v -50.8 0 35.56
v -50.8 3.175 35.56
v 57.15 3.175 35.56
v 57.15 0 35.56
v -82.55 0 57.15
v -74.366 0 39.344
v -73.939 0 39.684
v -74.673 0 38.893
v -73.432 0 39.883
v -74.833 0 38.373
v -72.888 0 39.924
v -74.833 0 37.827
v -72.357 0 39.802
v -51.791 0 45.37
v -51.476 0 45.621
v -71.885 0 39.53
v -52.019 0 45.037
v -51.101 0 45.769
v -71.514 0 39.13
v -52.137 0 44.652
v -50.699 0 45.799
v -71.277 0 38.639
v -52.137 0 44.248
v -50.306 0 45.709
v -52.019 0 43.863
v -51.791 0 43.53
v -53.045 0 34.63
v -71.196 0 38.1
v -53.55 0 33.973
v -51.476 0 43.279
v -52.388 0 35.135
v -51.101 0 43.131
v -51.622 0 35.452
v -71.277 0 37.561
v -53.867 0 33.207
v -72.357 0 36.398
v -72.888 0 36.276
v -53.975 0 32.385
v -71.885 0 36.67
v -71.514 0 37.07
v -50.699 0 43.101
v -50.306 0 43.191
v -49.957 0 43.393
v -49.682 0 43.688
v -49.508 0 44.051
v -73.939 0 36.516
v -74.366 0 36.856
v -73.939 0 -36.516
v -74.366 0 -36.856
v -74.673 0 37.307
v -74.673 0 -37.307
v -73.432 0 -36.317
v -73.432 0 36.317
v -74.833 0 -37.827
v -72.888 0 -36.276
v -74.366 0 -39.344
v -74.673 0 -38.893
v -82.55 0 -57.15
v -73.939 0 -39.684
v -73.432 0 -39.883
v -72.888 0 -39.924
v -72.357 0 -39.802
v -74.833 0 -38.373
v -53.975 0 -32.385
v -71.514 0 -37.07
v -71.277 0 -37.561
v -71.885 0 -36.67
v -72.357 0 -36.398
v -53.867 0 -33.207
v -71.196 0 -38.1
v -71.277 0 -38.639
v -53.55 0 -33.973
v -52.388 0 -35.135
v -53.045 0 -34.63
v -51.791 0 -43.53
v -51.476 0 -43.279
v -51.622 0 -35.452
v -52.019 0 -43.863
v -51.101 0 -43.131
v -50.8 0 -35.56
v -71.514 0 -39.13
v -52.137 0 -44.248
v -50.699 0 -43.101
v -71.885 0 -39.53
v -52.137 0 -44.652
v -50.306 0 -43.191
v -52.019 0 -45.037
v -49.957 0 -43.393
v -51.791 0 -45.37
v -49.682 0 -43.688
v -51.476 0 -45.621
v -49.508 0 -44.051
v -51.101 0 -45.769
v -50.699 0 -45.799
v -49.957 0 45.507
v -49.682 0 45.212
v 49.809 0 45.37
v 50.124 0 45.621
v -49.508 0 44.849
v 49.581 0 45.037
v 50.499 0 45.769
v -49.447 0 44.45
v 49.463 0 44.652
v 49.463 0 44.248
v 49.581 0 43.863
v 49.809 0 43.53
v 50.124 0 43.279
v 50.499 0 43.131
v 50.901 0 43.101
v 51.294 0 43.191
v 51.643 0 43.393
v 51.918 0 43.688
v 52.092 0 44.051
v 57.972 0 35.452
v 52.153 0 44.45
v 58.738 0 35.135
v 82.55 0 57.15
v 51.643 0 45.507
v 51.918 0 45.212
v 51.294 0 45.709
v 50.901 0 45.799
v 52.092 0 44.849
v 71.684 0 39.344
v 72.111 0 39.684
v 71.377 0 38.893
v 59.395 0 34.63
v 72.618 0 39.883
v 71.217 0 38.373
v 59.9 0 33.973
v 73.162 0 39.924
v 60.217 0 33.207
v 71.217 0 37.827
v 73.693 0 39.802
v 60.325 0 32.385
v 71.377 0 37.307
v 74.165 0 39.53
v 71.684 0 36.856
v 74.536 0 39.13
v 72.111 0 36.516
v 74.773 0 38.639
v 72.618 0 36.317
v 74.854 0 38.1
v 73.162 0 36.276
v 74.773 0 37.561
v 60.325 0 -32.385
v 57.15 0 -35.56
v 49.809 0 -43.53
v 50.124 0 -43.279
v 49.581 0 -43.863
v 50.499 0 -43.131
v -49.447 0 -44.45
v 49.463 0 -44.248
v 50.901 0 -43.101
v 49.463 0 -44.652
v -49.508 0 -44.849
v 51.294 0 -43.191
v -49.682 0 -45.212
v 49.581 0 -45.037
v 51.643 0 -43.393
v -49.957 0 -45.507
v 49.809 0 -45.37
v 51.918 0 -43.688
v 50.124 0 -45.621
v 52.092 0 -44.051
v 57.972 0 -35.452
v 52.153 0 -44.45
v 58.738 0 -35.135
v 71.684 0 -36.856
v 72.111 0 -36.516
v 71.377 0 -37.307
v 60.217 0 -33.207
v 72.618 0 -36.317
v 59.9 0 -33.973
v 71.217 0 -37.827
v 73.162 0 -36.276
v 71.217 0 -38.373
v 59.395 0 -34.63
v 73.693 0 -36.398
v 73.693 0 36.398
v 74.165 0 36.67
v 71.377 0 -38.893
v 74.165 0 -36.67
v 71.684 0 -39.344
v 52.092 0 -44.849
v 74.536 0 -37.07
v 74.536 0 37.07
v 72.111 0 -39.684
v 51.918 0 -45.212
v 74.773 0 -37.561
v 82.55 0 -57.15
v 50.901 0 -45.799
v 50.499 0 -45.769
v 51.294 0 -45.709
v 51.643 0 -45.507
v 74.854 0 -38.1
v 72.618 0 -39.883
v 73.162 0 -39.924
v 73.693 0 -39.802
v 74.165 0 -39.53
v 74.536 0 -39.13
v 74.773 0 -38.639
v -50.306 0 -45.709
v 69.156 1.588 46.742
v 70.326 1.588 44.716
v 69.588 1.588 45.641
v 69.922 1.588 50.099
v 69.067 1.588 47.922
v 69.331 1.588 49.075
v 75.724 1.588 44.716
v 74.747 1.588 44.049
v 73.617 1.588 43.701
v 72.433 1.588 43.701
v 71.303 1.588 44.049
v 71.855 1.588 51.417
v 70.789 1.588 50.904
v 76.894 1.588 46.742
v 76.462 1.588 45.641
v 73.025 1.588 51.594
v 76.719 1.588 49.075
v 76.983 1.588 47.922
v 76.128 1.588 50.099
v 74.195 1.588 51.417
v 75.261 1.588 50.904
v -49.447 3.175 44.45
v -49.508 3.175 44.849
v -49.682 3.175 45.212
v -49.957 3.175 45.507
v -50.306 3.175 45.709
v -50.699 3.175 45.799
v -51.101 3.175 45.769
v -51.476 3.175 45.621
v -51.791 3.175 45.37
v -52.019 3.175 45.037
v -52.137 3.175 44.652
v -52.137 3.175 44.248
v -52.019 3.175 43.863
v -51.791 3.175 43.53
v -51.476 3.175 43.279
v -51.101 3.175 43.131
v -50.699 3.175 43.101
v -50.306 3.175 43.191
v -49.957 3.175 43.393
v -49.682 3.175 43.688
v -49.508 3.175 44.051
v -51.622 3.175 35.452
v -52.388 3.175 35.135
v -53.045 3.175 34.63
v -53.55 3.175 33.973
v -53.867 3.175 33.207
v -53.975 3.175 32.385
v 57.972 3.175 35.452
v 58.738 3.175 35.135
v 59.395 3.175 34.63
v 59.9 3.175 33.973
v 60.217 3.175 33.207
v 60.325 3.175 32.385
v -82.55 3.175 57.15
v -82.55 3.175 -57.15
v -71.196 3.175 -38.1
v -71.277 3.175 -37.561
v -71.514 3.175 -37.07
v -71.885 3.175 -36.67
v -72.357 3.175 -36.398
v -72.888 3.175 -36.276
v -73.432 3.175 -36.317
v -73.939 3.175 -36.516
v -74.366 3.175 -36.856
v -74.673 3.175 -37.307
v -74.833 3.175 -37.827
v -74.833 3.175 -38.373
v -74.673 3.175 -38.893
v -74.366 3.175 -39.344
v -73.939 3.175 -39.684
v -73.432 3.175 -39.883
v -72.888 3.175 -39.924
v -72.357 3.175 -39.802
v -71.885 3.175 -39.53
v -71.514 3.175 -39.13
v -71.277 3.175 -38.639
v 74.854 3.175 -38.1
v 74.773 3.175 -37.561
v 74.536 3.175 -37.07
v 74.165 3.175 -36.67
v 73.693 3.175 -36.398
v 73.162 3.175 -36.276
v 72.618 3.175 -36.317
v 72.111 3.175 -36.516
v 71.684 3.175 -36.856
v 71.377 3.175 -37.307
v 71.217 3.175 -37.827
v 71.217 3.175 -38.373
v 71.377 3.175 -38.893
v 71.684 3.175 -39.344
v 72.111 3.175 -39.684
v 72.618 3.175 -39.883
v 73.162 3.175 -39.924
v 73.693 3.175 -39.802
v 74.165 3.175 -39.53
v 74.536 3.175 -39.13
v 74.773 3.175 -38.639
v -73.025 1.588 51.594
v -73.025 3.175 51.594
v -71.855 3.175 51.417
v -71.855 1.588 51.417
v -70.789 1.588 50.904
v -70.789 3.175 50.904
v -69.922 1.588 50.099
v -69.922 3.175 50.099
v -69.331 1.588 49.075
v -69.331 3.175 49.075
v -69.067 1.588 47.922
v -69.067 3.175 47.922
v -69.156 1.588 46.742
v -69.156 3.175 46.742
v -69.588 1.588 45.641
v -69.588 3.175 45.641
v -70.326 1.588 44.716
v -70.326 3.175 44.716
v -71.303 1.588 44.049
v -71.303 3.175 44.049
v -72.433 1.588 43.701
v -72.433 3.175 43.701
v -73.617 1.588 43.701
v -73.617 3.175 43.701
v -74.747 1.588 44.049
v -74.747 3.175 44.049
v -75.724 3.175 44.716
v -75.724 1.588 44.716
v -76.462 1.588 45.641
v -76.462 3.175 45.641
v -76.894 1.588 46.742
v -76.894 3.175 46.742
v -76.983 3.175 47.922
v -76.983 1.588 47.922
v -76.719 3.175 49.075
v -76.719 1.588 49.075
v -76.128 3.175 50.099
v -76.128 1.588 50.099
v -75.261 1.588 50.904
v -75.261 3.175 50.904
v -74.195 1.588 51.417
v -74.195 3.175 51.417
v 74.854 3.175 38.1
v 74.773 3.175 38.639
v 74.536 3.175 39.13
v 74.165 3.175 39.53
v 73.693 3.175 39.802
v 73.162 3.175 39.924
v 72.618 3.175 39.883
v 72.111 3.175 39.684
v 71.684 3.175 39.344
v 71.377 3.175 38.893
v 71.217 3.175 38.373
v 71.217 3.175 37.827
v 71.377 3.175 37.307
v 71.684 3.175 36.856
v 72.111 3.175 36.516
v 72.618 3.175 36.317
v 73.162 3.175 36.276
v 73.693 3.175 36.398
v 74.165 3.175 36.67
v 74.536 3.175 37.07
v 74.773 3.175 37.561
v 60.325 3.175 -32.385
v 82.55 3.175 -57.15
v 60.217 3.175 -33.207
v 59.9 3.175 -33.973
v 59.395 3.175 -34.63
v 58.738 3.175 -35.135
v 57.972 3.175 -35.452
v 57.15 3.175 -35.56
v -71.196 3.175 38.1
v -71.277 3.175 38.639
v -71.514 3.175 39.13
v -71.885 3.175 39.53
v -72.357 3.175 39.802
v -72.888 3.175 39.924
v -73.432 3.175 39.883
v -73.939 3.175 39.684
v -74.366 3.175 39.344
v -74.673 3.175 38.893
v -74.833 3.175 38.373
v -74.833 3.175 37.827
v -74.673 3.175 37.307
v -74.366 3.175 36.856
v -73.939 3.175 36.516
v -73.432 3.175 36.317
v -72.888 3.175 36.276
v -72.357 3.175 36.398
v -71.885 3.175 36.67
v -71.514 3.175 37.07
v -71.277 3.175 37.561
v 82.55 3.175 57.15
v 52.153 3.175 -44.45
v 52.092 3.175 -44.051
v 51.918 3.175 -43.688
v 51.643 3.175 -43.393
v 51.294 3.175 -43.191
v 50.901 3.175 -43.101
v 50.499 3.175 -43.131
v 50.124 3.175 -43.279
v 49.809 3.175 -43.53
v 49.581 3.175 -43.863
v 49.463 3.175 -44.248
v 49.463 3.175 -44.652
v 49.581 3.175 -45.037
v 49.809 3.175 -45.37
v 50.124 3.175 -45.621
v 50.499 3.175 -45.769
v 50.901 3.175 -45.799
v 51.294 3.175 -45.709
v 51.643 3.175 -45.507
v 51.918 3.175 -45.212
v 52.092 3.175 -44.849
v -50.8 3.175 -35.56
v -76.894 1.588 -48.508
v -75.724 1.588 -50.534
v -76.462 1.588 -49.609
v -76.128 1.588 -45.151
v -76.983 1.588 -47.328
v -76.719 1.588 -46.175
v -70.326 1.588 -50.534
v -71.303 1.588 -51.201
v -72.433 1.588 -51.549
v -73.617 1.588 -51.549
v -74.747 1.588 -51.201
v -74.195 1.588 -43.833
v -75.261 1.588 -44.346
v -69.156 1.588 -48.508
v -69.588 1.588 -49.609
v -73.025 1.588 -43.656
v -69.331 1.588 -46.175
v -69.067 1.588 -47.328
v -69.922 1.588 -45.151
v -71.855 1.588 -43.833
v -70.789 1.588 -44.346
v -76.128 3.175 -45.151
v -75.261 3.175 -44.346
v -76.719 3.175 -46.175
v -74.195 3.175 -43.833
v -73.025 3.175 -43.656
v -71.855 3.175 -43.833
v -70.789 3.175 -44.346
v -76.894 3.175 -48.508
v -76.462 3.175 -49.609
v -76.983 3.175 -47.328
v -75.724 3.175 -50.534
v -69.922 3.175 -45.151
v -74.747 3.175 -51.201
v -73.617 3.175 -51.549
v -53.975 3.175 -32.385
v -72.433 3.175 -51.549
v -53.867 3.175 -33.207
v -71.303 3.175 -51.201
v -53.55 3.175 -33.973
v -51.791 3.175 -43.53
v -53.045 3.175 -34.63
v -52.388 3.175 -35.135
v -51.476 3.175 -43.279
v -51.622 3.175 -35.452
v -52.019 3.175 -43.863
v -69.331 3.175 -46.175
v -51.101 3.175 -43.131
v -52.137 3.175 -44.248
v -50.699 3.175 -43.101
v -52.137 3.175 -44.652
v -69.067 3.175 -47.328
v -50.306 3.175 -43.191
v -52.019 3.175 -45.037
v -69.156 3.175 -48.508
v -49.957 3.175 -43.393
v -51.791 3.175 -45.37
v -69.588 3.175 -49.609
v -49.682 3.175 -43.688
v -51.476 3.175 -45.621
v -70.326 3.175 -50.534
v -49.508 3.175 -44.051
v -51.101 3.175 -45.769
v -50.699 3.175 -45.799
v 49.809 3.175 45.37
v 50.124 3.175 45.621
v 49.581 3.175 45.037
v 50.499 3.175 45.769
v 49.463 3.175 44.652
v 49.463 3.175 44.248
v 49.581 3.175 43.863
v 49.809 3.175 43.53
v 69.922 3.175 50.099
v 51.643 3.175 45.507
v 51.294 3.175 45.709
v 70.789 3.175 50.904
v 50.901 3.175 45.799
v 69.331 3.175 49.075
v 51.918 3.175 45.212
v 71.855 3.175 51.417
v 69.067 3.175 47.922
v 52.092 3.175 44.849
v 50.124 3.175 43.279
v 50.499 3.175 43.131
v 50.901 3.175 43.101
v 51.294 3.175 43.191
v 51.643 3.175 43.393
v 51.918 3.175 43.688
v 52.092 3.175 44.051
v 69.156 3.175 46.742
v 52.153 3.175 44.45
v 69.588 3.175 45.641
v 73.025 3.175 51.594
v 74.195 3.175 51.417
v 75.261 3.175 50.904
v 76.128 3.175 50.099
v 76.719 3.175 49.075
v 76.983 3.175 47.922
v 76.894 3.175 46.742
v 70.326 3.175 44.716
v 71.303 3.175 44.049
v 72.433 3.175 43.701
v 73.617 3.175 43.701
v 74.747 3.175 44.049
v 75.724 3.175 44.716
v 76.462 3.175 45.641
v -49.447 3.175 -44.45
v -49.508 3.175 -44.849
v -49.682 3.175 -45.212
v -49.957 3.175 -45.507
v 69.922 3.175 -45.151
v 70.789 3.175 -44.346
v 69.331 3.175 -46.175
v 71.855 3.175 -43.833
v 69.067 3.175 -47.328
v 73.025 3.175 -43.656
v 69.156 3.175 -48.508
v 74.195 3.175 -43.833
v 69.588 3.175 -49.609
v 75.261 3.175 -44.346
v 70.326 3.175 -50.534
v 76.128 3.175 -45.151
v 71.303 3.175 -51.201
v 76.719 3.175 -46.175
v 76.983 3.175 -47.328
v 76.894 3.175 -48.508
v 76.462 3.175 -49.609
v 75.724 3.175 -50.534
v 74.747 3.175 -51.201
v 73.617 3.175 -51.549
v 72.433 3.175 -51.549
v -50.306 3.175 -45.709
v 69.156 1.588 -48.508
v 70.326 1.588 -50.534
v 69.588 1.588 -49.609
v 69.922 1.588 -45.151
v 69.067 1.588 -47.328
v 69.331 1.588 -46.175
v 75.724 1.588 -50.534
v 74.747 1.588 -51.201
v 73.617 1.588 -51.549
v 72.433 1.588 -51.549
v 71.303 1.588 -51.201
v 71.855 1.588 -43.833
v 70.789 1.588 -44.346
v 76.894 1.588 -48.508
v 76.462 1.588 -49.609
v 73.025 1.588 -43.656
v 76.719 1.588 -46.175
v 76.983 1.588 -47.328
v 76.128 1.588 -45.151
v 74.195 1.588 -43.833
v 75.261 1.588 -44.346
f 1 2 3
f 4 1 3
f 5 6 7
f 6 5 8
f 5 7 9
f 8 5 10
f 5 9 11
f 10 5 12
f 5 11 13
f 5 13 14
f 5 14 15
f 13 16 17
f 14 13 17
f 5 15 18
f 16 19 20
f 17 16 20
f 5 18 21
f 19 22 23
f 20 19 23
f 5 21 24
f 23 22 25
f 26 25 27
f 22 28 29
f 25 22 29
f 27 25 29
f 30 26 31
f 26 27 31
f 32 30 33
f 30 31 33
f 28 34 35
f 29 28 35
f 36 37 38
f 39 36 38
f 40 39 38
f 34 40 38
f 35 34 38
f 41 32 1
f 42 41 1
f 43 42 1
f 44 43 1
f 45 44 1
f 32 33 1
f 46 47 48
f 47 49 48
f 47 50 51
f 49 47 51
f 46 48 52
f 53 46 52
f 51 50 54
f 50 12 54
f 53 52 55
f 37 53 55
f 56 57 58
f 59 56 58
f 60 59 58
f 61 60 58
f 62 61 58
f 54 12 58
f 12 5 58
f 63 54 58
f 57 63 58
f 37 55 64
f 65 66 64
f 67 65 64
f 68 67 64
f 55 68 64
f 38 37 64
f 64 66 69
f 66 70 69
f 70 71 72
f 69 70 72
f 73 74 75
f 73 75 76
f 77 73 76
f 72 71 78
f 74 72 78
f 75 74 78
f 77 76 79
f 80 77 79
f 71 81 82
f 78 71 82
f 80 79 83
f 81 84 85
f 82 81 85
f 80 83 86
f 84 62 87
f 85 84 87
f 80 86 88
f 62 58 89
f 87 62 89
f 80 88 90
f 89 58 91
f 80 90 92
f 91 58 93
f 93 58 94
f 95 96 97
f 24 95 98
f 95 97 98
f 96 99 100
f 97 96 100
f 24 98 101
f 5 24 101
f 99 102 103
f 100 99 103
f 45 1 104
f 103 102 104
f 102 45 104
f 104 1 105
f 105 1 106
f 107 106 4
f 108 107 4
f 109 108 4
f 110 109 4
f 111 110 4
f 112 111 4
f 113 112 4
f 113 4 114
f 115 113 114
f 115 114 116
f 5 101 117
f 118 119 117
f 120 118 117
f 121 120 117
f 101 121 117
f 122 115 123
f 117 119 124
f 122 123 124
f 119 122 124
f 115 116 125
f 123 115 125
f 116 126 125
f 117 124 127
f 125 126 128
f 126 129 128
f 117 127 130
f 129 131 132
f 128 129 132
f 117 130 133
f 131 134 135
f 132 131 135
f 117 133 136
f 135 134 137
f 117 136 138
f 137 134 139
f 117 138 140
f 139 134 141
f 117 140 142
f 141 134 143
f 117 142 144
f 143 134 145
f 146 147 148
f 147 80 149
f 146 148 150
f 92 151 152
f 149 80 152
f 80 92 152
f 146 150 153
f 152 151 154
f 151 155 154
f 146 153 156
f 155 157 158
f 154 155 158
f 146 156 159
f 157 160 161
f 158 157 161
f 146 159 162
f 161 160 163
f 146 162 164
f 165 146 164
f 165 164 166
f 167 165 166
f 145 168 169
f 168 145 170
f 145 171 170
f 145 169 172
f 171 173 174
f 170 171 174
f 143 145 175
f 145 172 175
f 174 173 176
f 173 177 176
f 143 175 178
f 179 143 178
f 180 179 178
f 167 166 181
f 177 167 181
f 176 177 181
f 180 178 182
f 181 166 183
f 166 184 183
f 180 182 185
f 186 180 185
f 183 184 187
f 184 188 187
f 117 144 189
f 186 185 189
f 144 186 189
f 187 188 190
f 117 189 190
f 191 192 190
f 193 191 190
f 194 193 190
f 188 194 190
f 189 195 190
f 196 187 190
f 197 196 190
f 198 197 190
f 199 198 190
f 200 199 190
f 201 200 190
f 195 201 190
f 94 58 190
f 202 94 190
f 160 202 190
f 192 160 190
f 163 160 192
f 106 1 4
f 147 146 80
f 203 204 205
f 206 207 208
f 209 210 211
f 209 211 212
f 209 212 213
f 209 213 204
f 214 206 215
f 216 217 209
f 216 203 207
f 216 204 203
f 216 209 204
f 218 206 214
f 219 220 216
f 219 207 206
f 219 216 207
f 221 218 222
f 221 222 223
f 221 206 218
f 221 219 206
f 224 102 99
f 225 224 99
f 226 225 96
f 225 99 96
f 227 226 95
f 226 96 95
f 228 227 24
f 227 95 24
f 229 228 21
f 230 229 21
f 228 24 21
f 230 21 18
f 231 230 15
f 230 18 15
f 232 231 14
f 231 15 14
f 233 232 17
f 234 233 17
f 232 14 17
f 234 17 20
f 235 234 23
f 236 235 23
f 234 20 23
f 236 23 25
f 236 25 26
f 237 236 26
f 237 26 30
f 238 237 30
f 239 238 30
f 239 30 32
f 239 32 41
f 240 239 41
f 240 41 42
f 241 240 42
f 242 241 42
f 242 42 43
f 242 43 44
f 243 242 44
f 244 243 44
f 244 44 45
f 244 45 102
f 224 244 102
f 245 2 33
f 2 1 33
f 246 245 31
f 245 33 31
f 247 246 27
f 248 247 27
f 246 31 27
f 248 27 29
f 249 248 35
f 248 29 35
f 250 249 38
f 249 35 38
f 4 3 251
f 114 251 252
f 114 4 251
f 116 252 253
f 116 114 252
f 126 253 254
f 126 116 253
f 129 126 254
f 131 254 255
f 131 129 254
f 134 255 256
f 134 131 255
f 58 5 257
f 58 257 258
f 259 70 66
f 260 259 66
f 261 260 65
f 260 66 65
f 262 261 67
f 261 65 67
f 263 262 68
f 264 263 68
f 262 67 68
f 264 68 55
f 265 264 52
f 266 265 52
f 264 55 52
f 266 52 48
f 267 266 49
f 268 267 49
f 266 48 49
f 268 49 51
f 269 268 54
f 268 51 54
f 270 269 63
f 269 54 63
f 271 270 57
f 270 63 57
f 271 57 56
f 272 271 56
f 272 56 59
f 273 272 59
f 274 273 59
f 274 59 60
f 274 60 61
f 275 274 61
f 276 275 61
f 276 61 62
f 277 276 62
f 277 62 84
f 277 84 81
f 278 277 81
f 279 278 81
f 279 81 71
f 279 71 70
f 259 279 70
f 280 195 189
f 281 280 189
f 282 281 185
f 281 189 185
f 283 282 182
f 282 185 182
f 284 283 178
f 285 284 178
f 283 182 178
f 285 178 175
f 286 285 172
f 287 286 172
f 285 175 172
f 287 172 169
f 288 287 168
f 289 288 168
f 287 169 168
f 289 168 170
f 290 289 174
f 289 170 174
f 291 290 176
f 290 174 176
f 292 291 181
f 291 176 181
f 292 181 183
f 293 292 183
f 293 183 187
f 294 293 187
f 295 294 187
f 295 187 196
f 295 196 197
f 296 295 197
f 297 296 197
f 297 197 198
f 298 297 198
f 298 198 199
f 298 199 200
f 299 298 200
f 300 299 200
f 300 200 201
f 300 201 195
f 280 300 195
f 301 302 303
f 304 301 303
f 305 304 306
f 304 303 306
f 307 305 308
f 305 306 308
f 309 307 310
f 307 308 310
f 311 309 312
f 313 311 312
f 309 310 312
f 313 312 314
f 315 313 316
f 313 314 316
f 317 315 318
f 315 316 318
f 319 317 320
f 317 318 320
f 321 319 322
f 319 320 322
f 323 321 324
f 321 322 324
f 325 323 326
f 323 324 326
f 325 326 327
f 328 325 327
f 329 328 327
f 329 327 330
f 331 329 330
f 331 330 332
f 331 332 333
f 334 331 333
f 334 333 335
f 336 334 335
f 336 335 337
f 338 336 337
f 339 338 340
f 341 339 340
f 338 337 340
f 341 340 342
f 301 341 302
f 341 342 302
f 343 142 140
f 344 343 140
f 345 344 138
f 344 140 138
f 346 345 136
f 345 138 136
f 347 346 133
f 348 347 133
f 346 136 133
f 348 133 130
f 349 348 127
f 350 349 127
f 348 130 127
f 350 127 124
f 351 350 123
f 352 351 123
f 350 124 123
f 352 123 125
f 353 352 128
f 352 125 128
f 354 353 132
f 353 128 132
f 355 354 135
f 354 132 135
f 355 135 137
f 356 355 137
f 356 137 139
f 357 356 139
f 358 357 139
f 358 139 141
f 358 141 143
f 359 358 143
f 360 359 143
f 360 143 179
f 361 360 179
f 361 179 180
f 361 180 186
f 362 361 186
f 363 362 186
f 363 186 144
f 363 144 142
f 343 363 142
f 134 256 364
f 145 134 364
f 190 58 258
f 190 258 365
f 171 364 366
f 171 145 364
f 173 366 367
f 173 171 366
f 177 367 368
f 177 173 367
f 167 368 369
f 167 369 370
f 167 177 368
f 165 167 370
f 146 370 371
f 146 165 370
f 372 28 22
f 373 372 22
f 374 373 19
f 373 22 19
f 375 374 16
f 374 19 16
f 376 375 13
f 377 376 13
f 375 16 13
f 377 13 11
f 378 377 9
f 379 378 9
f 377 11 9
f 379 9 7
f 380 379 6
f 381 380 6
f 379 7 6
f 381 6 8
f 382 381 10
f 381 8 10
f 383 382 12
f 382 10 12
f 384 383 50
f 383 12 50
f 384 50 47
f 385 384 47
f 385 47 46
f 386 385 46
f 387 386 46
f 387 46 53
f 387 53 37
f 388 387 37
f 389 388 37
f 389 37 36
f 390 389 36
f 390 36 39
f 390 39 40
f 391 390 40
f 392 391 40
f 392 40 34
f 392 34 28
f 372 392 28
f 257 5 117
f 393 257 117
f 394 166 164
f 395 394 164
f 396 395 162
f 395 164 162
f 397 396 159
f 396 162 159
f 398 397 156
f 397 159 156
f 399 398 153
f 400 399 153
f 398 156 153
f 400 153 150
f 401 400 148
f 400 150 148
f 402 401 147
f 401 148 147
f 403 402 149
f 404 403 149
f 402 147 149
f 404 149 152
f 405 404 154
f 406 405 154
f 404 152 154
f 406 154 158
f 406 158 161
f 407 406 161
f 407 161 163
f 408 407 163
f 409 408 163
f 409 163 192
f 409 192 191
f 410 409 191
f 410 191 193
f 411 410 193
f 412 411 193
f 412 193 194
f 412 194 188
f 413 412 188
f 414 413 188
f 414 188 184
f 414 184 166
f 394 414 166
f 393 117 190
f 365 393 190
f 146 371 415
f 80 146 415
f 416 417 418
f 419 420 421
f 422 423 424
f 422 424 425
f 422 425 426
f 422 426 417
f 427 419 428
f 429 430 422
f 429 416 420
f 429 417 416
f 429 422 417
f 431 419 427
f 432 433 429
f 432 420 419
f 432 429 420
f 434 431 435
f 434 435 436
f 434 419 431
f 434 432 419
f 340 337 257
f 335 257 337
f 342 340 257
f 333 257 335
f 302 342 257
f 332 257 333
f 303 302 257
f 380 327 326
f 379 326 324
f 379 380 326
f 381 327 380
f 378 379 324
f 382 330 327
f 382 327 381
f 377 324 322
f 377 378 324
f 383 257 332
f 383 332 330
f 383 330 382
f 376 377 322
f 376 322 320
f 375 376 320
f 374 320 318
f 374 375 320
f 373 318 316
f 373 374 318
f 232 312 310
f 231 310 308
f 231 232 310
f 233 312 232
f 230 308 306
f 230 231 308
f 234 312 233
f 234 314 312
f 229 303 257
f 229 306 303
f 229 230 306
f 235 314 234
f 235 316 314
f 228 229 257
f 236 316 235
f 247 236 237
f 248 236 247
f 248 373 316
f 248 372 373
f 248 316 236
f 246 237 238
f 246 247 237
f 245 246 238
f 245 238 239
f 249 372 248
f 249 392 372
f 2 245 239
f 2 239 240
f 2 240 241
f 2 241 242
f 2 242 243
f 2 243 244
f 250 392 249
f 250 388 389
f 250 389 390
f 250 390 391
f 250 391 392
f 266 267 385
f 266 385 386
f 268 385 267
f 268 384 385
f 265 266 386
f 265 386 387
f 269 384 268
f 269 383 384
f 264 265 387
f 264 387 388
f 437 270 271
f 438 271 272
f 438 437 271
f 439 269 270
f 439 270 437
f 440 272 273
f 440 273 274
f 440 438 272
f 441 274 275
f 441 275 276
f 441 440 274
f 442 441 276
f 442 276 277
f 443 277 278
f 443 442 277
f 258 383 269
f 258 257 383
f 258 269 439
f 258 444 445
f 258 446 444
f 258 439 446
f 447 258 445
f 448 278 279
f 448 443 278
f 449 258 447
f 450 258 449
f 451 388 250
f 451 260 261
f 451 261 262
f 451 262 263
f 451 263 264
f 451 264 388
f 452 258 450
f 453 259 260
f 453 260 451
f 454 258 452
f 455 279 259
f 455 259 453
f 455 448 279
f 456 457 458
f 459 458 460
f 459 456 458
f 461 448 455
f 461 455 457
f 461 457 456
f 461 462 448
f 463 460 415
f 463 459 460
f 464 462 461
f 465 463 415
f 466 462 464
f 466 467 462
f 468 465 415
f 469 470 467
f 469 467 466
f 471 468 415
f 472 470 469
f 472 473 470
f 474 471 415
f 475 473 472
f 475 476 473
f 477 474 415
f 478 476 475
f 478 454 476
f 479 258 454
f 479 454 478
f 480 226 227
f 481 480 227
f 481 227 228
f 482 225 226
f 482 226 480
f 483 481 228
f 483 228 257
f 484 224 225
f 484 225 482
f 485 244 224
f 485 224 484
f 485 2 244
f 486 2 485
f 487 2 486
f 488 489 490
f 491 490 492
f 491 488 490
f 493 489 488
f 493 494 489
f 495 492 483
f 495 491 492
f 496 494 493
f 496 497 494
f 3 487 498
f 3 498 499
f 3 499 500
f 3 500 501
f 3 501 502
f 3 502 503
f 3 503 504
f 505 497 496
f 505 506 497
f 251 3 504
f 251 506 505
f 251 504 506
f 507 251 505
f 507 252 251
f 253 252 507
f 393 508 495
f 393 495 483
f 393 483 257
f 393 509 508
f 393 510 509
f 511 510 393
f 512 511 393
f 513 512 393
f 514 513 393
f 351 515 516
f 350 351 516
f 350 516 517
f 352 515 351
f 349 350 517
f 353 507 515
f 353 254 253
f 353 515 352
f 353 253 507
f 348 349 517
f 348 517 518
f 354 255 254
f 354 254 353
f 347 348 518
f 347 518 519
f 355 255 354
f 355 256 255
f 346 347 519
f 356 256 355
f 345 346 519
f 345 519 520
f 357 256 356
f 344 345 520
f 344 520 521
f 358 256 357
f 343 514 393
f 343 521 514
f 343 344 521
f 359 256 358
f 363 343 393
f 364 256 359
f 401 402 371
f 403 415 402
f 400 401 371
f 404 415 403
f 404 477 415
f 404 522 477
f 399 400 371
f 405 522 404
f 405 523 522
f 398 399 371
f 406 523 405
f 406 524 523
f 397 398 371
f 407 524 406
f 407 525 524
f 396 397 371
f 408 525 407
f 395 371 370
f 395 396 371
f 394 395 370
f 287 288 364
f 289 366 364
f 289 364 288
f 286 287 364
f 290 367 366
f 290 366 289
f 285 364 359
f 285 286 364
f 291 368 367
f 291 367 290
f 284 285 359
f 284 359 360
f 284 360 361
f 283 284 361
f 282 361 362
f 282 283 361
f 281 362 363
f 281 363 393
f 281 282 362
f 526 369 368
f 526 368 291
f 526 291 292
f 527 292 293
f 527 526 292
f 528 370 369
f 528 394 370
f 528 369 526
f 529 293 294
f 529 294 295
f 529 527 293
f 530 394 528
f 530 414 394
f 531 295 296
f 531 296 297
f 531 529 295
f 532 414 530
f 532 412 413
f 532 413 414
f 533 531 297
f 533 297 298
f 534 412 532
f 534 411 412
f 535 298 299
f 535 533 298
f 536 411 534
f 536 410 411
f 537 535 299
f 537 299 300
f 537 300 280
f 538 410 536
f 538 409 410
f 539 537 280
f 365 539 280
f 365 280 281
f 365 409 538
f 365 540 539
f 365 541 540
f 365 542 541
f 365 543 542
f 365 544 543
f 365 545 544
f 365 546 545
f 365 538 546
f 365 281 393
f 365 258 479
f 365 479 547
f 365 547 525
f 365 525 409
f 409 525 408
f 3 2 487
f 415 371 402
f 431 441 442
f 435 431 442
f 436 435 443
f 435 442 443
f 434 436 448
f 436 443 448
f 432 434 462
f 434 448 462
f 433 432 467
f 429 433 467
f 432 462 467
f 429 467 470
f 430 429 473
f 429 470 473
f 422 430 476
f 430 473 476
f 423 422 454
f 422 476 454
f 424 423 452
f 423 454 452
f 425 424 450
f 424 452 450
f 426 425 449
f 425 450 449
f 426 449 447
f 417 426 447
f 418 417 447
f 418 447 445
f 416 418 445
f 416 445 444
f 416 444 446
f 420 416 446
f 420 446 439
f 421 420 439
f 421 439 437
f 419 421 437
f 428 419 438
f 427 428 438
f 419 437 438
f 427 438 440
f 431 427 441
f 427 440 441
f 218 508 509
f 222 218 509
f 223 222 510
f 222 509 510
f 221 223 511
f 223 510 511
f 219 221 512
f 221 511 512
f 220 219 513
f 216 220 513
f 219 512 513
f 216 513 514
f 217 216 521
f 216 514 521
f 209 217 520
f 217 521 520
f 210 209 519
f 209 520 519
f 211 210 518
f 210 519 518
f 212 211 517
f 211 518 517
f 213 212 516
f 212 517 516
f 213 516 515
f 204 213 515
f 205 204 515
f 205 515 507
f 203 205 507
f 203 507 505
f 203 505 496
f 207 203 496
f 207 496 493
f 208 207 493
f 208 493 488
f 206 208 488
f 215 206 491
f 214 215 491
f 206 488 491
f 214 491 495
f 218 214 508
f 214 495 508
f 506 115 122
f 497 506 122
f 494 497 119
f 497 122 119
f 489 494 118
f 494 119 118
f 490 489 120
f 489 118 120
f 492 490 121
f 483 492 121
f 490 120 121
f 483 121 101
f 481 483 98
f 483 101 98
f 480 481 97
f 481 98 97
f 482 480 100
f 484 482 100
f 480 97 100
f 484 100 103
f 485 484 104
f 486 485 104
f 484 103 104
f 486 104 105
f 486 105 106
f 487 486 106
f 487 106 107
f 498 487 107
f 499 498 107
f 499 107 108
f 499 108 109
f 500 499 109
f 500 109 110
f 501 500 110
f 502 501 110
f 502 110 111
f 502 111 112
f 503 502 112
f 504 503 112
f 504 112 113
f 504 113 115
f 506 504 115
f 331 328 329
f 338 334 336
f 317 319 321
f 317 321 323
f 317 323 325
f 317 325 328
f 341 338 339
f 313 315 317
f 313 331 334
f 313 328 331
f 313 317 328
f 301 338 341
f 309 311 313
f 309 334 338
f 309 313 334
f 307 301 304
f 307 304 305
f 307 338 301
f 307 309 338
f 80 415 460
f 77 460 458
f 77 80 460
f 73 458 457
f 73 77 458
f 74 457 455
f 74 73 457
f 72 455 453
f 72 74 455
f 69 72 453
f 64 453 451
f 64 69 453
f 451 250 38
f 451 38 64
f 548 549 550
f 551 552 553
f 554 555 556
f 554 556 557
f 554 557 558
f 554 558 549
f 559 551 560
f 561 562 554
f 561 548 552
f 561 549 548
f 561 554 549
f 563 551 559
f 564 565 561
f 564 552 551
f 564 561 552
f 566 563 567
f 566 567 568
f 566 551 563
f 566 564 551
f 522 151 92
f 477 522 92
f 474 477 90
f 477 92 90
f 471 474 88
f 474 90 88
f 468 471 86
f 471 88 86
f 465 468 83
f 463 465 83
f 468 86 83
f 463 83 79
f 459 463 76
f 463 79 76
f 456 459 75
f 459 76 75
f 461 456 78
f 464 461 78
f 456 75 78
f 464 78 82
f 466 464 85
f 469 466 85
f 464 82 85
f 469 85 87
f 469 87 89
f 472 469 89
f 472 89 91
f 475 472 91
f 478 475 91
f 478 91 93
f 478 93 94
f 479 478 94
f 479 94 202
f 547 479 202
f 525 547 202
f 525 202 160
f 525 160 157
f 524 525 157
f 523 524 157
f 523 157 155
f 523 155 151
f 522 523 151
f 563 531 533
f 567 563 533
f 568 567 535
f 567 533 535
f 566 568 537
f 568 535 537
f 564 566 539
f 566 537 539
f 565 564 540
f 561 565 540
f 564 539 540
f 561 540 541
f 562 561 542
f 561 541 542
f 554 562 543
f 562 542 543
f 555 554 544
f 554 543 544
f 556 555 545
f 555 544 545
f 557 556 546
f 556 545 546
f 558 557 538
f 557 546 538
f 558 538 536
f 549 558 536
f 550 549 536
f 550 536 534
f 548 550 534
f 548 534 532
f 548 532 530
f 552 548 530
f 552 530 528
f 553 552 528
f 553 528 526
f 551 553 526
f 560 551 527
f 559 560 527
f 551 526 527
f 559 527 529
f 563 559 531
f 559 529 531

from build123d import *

# Parameters (mm, degrees)
SKETCH1_W                       = 165.1
SKETCH1_H                       = 114.3
BOSS_EXTRUDE1_DEPTH             = 3.175
SKETCH3_R                       = 3.96875
CUT_EXTRUDE2_DEPTH              = 1.5875
F_6_32_TAPPED_HOLE1_D           = 2.7051
SKETCH11_W                      = 107.95
SKETCH11_H                      = 71.12
SKETCH11_W_2                    = 6.35
CUT_EXTRUDE3_DEPTH              = 101.452504324
FILLET1_R                       = 3.175
F_27_0_144_DIAMETER_HOLE1_D     = 3.6576
F_27_0_144_DIAMETER_HOLE1_DEPTH = 3.302
F_27_0_144_DIAMETER_HOLE1_TIP   = 1.0988539


with BuildPart() as part:
    # Sketch1 → Boss-Extrude1 (new body)
    with BuildSketch(Plane(origin=(0, 0, 0), x_dir=(1, 0, 0), z_dir=(0, 1, 0))):
        Rectangle(SKETCH1_W, SKETCH1_H)
    extrude(amount=BOSS_EXTRUDE1_DEPTH)

    # Sketch3 → Cut-Extrude2 (cut)
    with BuildSketch(Plane(origin=(0, 3.175, 0), x_dir=(1, 0, 0), z_dir=(0, 1, 0))):
        with Locations(Location((-73.025, 47.625, 0), (0, 0, 270))):
            Circle(SKETCH3_R)
        with Locations(Location((-73.025, -47.625, 0), (0, 0, 270))):
            Circle(SKETCH3_R)
        with Locations(Location((73.025, 47.625, 0), (0, 0, 270))):
            Circle(SKETCH3_R)
        with Locations(Location((73.025, -47.625, 0), (0, 0, 270))):
            Circle(SKETCH3_R)
    extrude(amount=-CUT_EXTRUDE2_DEPTH, mode=Mode.SUBTRACT)

    # #6-32 Tapped Hole1 (through all)
    with Locations(Plane(origin=(0, 3.175, 0), x_dir=(-1, 0, 0), z_dir=(0, 1, 0))):
        with Locations((50.8, -44.45), (-50.8, -44.45), (-50.8, 44.45), (50.8, 44.45)):
            Hole(F_6_32_TAPPED_HOLE1_D / 2)

    # Sketch11 → Cut-Extrude3 (cut, through all)
    with BuildSketch(Plane(origin=(0, 3.175, 0), x_dir=(1, 0, 0), z_dir=(0, 1, 0))):
        Rectangle(SKETCH11_W, SKETCH11_H)
        with Locations((57.15, 0)):
            Rectangle(SKETCH11_W_2, SKETCH11_H)
    extrude(amount=-CUT_EXTRUDE3_DEPTH, mode=Mode.SUBTRACT)

    # Fillet1
    fillet1_edges = [part.edges().sort_by_distance(p)[0] for p in [
        (60.325, 1.5875, 35.56),
        (-53.975, 1.5875, 35.56),
        (-53.975, 1.5875, -35.56),
        (60.325, 1.5875, -35.56),
    ]]
    fillet(fillet1_edges, radius=FILLET1_R)

    # #27 (0.144) Diameter Hole1
    with Locations(Plane(origin=(0, 3.175, 0), x_dir=(-1, 0, 0), z_dir=(0, 1, 0))):
        with Locations((73.025, -38.1), (73.025, 38.1), (-73.025, -38.1), (-73.025, 38.1)):
            Hole(F_27_0_144_DIAMETER_HOLE1_D / 2, depth=F_27_0_144_DIAMETER_HOLE1_DEPTH)
            with Locations((0, 0, -(F_27_0_144_DIAMETER_HOLE1_DEPTH + F_27_0_144_DIAMETER_HOLE1_TIP / 2))):  # 118° drill point
                Cone(0, F_27_0_144_DIAMETER_HOLE1_D / 2, F_27_0_144_DIAMETER_HOLE1_TIP, mode=Mode.SUBTRACT)


solid = part.part
